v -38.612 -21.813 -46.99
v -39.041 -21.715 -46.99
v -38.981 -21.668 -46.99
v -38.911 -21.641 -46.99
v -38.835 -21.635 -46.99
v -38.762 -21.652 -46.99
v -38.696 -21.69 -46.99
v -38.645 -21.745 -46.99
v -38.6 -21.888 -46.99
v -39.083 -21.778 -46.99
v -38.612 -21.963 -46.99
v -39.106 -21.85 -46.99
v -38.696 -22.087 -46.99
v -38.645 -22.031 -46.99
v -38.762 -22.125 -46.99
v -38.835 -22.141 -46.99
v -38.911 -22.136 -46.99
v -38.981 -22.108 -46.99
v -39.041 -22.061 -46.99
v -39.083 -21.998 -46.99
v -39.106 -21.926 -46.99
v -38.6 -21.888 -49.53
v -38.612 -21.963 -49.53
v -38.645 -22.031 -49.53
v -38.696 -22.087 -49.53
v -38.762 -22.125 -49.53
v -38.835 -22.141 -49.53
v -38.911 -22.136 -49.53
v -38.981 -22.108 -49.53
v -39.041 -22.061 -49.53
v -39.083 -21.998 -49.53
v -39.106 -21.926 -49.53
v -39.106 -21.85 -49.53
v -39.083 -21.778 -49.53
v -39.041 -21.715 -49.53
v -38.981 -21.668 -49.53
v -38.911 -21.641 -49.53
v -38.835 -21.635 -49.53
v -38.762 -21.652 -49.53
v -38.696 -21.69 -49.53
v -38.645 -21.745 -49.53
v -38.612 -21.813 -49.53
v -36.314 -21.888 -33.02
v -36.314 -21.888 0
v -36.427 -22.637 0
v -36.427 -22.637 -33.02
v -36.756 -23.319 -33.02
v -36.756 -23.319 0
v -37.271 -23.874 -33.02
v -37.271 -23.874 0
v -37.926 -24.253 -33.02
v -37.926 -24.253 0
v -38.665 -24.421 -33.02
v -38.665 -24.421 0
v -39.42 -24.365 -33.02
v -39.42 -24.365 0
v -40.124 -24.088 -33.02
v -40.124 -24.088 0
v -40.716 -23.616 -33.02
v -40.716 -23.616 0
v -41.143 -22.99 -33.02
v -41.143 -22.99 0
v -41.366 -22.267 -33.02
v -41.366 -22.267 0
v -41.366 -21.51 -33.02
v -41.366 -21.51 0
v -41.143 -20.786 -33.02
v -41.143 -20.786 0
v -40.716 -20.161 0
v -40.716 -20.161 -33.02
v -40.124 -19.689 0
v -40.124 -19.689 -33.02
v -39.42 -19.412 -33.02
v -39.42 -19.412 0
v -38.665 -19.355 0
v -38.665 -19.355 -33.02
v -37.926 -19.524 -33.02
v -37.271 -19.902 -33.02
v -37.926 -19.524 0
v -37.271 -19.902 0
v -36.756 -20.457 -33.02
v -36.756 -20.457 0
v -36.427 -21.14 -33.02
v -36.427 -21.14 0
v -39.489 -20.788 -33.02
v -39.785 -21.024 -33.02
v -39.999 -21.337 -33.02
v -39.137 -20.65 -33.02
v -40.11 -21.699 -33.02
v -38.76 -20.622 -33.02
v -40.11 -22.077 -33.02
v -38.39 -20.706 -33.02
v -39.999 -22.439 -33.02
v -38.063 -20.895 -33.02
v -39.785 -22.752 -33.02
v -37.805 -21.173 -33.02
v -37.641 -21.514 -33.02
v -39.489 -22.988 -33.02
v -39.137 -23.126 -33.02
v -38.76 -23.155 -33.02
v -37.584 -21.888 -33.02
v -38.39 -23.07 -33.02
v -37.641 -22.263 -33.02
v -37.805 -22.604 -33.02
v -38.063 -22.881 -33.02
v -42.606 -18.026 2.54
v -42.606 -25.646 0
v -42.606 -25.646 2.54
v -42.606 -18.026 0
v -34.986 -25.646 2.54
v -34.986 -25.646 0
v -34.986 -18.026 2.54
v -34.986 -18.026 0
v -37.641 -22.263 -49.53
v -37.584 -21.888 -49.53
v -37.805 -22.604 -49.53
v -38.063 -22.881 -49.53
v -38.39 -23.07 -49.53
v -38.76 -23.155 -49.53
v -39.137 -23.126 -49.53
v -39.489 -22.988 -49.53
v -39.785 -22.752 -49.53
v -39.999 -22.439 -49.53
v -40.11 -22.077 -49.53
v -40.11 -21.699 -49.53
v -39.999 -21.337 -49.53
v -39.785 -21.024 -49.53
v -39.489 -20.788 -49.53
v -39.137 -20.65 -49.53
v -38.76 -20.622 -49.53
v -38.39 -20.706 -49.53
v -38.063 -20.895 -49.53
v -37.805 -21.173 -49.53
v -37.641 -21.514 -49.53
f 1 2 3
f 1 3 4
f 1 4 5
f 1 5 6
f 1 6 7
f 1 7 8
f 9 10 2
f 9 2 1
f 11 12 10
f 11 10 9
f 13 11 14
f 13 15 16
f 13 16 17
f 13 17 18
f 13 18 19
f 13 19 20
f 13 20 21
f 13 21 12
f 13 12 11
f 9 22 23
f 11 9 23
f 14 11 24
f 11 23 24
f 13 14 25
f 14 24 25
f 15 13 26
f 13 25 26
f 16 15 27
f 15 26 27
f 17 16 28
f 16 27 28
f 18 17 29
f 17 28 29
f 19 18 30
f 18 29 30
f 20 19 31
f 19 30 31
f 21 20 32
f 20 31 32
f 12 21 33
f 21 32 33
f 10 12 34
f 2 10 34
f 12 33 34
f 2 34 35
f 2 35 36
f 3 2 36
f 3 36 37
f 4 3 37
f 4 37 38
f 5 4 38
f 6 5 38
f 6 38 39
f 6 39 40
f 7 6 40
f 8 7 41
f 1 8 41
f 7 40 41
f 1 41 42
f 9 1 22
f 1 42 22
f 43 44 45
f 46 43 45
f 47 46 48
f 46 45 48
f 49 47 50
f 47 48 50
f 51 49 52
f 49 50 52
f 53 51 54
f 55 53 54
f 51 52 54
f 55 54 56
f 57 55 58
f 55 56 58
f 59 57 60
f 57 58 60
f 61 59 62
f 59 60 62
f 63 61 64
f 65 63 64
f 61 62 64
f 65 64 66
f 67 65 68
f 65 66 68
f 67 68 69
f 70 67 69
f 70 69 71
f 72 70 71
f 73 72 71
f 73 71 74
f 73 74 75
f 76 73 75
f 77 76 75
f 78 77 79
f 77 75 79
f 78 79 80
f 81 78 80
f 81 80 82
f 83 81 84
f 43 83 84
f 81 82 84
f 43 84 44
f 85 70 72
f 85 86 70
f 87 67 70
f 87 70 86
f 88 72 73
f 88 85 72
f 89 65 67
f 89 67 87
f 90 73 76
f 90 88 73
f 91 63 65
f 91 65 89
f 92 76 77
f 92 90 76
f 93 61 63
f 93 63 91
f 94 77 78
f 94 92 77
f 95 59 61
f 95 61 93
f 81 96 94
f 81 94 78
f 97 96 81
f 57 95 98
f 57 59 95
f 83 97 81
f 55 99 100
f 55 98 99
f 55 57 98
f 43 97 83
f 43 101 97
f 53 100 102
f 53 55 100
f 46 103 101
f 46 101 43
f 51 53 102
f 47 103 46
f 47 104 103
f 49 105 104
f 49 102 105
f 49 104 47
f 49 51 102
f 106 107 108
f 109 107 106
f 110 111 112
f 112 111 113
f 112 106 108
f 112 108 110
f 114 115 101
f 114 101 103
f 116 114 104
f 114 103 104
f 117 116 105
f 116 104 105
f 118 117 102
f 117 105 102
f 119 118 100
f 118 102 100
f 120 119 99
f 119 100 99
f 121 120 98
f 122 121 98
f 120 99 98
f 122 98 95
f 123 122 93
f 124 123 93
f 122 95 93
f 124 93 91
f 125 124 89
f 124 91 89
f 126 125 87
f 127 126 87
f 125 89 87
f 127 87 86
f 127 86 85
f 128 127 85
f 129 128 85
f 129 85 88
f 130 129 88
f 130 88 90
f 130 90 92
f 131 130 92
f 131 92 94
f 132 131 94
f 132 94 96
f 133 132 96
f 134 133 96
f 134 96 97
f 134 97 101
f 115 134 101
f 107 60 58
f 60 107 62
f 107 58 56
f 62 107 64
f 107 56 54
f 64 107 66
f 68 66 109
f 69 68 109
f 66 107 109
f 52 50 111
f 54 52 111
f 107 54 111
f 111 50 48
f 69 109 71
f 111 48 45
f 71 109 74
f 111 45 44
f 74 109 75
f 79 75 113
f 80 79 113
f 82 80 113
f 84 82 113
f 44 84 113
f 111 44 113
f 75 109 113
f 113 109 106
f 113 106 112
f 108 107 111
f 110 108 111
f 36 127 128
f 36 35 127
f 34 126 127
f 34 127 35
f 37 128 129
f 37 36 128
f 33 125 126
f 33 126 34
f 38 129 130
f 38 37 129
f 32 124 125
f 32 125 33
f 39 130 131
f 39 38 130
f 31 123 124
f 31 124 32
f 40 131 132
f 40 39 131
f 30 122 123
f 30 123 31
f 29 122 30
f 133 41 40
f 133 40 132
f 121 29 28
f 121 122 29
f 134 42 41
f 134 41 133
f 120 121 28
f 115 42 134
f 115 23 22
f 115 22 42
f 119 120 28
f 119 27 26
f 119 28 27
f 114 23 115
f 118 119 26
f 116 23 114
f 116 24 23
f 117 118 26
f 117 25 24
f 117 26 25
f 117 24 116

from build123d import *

# Parameters (mm, degrees)
F0_W     = 7.62
F0_H     = 7.62
F1_DEPTH = 2.54
F2_R     = 1.27
F3_DEPTH = 49.53
F4_R     = 0.254
F5_DEPTH = 2.54
F2_R_2   = 2.54
F6_DEPTH = 33.02


with BuildPart() as f1:
    # F0 (on Top) → F1 (new body)
    with BuildSketch(Plane.XY):
        with Locations((-38.795546, -21.835937)):
            Rectangle(F0_W, F0_H)
    extrude(amount=F1_DEPTH)

    # F2 (on face) → F3 (join)
    with BuildSketch(Plane(origin=(0, 0, 0), x_dir=(1, 0, 0), z_dir=(0, 0, -1))):
        with Locations((-38.854431, 21.888208)):
            Circle(F2_R)
    extrude(amount=F3_DEPTH)

    # F4 (on face) → F5 (cut)
    with BuildSketch(Plane(origin=(0, 0, -49.53), x_dir=(1, 0, 0), z_dir=(0, 0, -1))):
        with Locations((-38.854431, 21.888208)):
            Circle(F4_R)
    extrude(amount=-F5_DEPTH, mode=Mode.SUBTRACT)

    # F2 (on face) → F6 (join)
    with BuildSketch(Plane(origin=(0, 0, 0), x_dir=(1, 0, 0), z_dir=(0, 0, -1))):
        with Locations((-38.854431, 21.888208)):
            Circle(F2_R_2)
        with Locations((-38.854431, 21.888208)):
            Circle(F2_R, mode=Mode.SUBTRACT)
    extrude(amount=F6_DEPTH)


solid = f1.part
